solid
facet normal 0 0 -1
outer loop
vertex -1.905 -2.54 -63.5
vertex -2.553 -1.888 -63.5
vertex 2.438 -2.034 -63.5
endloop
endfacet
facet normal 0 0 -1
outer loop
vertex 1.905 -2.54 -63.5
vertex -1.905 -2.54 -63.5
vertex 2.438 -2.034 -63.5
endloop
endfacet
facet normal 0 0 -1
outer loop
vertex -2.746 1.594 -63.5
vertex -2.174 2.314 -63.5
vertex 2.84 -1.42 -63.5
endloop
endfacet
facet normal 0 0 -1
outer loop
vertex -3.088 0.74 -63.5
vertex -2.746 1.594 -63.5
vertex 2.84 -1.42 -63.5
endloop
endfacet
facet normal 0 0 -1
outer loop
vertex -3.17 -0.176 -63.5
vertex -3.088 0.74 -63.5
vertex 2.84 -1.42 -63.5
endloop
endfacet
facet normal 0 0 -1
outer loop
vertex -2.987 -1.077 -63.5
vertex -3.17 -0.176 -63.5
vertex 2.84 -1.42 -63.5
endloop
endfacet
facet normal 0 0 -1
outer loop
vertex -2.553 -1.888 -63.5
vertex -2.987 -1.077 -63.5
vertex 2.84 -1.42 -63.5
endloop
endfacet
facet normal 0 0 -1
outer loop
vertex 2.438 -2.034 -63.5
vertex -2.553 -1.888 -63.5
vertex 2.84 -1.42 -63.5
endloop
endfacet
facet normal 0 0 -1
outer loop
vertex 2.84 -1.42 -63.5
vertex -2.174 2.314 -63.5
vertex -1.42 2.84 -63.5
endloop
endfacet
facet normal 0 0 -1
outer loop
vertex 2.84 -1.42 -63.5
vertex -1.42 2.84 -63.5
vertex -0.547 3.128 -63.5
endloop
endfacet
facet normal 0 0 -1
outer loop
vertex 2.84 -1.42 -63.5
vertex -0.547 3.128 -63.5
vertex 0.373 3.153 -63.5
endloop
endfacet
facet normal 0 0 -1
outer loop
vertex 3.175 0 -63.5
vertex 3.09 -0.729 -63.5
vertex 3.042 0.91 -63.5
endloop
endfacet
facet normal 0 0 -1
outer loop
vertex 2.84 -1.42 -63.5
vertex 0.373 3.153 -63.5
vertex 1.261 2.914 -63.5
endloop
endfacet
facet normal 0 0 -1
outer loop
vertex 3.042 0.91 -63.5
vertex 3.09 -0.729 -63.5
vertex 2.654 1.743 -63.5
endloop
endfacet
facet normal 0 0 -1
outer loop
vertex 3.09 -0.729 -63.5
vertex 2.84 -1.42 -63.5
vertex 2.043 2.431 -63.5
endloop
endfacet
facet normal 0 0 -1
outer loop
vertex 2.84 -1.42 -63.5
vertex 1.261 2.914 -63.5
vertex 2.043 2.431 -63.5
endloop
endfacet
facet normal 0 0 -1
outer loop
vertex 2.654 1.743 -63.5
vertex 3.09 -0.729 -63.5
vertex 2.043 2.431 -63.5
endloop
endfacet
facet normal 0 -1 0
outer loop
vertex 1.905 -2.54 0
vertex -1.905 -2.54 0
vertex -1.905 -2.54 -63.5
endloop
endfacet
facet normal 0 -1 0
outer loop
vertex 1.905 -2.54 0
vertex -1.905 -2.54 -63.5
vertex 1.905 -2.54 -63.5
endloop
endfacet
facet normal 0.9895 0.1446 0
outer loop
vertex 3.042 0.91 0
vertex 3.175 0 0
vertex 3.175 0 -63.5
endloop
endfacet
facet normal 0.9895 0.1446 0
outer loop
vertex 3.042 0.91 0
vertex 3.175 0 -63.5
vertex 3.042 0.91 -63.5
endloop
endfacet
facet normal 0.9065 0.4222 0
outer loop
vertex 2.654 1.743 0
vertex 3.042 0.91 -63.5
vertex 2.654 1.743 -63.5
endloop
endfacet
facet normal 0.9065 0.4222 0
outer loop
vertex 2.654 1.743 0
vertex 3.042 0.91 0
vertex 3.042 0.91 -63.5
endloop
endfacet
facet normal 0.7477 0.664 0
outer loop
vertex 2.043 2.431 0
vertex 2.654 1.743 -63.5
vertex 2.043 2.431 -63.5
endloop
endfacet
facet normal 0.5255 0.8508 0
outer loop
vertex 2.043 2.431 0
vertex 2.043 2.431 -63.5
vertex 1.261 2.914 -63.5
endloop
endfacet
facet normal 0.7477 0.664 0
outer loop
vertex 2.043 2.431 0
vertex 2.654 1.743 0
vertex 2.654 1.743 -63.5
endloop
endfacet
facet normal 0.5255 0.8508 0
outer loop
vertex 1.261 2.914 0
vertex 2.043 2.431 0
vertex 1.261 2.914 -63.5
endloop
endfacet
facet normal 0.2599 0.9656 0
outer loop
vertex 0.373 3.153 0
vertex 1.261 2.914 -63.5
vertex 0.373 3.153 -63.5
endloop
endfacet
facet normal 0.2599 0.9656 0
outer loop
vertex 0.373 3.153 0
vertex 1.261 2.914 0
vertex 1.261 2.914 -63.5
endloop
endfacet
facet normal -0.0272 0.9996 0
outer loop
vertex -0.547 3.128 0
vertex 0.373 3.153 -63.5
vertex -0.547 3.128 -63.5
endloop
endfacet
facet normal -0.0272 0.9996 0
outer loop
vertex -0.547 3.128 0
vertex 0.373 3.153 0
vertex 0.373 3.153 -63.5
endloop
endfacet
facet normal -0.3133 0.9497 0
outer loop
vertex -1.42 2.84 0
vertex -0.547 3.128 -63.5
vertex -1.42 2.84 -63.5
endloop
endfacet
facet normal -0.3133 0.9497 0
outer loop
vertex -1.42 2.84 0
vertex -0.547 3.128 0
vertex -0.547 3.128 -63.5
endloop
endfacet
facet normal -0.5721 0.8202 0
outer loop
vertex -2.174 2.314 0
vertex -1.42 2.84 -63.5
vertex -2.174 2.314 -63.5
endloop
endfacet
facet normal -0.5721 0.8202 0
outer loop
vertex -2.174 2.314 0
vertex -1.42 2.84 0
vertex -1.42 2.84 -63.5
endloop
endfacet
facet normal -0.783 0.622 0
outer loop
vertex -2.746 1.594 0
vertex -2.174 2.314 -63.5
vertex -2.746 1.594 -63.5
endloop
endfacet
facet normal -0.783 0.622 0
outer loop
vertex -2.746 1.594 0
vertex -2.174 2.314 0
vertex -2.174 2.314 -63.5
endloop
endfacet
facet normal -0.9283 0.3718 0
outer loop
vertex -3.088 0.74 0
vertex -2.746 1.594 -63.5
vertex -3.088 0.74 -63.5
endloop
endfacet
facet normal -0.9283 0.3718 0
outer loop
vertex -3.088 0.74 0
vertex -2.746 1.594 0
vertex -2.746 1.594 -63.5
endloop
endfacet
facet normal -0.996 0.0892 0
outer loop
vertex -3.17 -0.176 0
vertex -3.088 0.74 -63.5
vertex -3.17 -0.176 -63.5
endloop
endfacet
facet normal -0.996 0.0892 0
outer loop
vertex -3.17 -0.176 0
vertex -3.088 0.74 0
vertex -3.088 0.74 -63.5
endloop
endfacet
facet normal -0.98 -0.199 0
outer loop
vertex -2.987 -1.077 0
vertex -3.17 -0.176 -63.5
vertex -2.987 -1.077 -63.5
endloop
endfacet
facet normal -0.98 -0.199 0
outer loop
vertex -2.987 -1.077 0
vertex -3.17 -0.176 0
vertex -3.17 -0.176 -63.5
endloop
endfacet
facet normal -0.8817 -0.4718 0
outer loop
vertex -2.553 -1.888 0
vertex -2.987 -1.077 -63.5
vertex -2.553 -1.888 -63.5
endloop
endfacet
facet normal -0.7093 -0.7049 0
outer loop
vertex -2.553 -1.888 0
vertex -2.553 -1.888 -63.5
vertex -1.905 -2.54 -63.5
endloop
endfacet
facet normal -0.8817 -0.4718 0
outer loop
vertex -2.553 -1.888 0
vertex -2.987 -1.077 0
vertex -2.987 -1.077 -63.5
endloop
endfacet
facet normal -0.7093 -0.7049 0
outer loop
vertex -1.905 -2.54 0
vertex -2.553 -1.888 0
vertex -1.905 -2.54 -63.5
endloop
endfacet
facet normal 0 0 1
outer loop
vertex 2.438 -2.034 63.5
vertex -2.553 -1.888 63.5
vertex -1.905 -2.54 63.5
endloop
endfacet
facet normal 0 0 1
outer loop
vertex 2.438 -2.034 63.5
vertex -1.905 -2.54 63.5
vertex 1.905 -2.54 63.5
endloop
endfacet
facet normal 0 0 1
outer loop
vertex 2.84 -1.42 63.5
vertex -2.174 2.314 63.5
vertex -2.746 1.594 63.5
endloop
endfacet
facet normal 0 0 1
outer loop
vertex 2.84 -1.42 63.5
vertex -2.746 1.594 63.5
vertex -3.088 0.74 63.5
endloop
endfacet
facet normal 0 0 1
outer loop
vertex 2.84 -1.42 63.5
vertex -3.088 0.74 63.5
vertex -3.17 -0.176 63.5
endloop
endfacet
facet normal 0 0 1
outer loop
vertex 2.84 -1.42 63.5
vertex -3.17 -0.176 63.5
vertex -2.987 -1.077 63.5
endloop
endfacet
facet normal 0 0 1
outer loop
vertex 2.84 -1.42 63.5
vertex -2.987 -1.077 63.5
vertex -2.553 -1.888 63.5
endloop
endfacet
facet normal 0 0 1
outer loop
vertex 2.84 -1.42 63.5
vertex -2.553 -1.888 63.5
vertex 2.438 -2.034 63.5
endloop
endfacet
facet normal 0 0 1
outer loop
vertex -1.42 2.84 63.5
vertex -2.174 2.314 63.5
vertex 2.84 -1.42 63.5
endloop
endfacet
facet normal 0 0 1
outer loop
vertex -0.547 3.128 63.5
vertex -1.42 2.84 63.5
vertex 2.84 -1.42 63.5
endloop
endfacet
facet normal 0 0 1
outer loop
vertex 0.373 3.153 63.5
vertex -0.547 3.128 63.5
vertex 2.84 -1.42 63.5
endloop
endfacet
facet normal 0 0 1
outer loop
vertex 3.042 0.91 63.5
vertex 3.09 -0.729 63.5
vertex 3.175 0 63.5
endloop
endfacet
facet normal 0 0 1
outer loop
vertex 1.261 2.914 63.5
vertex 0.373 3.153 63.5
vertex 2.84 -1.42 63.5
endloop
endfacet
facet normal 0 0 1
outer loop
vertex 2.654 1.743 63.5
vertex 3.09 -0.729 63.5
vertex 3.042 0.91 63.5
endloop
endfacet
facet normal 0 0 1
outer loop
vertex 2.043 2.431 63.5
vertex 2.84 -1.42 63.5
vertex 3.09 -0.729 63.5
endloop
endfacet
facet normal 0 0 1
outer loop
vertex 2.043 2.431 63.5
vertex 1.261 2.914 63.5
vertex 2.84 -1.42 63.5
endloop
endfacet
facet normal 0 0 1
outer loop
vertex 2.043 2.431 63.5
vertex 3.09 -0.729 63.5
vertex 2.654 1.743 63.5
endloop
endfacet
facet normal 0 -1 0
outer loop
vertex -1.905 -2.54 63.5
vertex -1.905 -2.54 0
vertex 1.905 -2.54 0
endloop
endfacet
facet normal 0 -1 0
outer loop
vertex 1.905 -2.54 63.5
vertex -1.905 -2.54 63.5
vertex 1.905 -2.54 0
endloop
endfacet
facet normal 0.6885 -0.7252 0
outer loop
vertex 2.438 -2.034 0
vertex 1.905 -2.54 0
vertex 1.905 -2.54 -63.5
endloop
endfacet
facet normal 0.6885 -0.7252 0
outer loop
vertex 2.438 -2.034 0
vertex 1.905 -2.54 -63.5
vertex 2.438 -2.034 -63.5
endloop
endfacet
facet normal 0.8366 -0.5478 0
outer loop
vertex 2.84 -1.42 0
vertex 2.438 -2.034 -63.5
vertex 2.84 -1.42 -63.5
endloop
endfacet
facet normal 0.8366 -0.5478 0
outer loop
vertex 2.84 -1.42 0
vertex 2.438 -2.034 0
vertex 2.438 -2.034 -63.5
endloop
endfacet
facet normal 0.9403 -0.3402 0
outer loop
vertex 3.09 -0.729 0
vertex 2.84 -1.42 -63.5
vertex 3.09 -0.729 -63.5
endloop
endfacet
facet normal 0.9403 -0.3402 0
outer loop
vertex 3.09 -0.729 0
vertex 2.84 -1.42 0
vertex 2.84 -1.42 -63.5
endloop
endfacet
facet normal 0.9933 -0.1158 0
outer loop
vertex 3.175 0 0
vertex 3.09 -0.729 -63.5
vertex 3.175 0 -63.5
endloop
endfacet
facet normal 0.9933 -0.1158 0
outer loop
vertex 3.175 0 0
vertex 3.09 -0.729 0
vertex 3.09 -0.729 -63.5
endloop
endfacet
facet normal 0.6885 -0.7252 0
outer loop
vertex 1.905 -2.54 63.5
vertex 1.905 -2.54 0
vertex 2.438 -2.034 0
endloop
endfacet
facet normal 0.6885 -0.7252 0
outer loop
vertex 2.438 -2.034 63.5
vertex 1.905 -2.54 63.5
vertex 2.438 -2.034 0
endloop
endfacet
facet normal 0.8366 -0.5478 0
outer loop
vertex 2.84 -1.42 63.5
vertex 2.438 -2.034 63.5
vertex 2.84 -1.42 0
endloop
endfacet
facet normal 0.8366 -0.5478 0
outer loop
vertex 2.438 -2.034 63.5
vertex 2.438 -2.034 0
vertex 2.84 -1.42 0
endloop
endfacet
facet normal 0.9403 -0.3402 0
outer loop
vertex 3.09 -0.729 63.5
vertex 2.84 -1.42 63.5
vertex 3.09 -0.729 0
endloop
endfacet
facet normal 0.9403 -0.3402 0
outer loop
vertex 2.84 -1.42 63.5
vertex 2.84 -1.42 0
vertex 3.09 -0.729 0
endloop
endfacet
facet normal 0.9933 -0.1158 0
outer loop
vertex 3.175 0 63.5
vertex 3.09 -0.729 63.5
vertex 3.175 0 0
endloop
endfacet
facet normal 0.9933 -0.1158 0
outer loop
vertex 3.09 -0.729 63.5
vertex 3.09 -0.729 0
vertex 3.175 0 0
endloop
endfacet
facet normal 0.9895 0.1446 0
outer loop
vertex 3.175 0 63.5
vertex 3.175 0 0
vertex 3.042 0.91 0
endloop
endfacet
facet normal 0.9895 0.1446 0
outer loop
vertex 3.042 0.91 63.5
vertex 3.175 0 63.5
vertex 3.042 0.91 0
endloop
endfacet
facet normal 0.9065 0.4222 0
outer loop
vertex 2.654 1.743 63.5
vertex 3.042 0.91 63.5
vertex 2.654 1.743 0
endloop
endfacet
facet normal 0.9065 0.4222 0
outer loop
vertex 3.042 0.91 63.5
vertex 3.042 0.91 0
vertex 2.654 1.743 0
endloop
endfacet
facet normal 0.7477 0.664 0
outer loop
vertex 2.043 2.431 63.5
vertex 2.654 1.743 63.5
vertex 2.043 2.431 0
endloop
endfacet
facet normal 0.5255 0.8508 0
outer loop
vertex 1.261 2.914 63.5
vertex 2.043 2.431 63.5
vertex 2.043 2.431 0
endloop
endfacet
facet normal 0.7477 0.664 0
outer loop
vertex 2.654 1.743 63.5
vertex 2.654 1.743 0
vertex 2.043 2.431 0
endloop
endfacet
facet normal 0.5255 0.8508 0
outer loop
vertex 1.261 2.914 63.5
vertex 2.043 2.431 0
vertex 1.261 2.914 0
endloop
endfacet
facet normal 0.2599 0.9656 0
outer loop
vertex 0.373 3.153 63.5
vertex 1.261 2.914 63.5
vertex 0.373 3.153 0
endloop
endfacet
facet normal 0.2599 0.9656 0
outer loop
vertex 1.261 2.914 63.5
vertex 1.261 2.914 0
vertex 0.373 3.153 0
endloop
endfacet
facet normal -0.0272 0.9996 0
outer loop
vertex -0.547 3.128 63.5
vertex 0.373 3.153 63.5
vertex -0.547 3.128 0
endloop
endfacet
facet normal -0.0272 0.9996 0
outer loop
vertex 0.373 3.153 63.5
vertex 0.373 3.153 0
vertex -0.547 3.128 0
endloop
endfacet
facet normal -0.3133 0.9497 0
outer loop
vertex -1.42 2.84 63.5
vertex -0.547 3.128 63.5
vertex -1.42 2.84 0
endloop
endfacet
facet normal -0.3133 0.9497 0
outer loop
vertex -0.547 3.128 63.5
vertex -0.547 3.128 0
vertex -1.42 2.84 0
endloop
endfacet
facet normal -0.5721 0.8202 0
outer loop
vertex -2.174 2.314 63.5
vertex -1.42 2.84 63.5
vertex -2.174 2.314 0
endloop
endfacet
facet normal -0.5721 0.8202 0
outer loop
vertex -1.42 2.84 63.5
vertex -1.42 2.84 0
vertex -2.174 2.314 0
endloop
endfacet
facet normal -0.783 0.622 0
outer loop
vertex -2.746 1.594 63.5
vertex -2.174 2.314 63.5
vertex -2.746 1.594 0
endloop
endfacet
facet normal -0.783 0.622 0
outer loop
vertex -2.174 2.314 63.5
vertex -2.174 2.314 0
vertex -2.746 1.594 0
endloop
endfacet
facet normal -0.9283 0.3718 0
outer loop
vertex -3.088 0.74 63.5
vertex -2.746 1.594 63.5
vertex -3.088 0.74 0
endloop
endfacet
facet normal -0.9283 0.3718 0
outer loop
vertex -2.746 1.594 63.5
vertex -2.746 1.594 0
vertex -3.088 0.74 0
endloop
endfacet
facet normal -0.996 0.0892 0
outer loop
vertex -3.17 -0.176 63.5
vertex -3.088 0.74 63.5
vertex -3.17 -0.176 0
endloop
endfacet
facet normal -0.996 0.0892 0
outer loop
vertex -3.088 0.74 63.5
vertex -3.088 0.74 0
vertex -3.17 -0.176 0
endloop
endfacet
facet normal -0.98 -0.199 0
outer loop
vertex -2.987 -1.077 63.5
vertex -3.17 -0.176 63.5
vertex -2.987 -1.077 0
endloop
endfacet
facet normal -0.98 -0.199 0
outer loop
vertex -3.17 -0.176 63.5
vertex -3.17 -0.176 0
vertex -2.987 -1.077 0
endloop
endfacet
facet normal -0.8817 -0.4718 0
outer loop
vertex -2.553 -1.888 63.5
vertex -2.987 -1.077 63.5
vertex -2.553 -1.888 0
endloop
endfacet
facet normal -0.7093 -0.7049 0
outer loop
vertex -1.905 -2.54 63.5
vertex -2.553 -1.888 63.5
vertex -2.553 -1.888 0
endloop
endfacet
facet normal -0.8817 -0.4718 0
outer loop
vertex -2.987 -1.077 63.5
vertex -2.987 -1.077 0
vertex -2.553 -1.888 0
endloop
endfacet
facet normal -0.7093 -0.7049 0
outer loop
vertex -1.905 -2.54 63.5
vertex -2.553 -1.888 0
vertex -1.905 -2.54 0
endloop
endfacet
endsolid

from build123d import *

# Parameters (mm, degrees)
BOSS_EXTRUDE1_DEPTH      = 63.5
BOSS_EXTRUDE1_DEPTH_BACK = 63.5


with BuildPart() as part:
    # Sketch1 → Boss-Extrude1 (new, two sides: drawn at the far end of the back side and taken through both)
    with BuildSketch(Plane.XY.offset(-BOSS_EXTRUDE1_DEPTH_BACK)):
        with BuildLine():
            Line((-1.905, -2.54), (1.905, -2.54))
            ThreePointArc((1.905, -2.54), (0, 3.175), (-1.905, -2.54))
        make_face()
    extrude(amount=BOSS_EXTRUDE1_DEPTH + BOSS_EXTRUDE1_DEPTH_BACK)


solid = part.part
